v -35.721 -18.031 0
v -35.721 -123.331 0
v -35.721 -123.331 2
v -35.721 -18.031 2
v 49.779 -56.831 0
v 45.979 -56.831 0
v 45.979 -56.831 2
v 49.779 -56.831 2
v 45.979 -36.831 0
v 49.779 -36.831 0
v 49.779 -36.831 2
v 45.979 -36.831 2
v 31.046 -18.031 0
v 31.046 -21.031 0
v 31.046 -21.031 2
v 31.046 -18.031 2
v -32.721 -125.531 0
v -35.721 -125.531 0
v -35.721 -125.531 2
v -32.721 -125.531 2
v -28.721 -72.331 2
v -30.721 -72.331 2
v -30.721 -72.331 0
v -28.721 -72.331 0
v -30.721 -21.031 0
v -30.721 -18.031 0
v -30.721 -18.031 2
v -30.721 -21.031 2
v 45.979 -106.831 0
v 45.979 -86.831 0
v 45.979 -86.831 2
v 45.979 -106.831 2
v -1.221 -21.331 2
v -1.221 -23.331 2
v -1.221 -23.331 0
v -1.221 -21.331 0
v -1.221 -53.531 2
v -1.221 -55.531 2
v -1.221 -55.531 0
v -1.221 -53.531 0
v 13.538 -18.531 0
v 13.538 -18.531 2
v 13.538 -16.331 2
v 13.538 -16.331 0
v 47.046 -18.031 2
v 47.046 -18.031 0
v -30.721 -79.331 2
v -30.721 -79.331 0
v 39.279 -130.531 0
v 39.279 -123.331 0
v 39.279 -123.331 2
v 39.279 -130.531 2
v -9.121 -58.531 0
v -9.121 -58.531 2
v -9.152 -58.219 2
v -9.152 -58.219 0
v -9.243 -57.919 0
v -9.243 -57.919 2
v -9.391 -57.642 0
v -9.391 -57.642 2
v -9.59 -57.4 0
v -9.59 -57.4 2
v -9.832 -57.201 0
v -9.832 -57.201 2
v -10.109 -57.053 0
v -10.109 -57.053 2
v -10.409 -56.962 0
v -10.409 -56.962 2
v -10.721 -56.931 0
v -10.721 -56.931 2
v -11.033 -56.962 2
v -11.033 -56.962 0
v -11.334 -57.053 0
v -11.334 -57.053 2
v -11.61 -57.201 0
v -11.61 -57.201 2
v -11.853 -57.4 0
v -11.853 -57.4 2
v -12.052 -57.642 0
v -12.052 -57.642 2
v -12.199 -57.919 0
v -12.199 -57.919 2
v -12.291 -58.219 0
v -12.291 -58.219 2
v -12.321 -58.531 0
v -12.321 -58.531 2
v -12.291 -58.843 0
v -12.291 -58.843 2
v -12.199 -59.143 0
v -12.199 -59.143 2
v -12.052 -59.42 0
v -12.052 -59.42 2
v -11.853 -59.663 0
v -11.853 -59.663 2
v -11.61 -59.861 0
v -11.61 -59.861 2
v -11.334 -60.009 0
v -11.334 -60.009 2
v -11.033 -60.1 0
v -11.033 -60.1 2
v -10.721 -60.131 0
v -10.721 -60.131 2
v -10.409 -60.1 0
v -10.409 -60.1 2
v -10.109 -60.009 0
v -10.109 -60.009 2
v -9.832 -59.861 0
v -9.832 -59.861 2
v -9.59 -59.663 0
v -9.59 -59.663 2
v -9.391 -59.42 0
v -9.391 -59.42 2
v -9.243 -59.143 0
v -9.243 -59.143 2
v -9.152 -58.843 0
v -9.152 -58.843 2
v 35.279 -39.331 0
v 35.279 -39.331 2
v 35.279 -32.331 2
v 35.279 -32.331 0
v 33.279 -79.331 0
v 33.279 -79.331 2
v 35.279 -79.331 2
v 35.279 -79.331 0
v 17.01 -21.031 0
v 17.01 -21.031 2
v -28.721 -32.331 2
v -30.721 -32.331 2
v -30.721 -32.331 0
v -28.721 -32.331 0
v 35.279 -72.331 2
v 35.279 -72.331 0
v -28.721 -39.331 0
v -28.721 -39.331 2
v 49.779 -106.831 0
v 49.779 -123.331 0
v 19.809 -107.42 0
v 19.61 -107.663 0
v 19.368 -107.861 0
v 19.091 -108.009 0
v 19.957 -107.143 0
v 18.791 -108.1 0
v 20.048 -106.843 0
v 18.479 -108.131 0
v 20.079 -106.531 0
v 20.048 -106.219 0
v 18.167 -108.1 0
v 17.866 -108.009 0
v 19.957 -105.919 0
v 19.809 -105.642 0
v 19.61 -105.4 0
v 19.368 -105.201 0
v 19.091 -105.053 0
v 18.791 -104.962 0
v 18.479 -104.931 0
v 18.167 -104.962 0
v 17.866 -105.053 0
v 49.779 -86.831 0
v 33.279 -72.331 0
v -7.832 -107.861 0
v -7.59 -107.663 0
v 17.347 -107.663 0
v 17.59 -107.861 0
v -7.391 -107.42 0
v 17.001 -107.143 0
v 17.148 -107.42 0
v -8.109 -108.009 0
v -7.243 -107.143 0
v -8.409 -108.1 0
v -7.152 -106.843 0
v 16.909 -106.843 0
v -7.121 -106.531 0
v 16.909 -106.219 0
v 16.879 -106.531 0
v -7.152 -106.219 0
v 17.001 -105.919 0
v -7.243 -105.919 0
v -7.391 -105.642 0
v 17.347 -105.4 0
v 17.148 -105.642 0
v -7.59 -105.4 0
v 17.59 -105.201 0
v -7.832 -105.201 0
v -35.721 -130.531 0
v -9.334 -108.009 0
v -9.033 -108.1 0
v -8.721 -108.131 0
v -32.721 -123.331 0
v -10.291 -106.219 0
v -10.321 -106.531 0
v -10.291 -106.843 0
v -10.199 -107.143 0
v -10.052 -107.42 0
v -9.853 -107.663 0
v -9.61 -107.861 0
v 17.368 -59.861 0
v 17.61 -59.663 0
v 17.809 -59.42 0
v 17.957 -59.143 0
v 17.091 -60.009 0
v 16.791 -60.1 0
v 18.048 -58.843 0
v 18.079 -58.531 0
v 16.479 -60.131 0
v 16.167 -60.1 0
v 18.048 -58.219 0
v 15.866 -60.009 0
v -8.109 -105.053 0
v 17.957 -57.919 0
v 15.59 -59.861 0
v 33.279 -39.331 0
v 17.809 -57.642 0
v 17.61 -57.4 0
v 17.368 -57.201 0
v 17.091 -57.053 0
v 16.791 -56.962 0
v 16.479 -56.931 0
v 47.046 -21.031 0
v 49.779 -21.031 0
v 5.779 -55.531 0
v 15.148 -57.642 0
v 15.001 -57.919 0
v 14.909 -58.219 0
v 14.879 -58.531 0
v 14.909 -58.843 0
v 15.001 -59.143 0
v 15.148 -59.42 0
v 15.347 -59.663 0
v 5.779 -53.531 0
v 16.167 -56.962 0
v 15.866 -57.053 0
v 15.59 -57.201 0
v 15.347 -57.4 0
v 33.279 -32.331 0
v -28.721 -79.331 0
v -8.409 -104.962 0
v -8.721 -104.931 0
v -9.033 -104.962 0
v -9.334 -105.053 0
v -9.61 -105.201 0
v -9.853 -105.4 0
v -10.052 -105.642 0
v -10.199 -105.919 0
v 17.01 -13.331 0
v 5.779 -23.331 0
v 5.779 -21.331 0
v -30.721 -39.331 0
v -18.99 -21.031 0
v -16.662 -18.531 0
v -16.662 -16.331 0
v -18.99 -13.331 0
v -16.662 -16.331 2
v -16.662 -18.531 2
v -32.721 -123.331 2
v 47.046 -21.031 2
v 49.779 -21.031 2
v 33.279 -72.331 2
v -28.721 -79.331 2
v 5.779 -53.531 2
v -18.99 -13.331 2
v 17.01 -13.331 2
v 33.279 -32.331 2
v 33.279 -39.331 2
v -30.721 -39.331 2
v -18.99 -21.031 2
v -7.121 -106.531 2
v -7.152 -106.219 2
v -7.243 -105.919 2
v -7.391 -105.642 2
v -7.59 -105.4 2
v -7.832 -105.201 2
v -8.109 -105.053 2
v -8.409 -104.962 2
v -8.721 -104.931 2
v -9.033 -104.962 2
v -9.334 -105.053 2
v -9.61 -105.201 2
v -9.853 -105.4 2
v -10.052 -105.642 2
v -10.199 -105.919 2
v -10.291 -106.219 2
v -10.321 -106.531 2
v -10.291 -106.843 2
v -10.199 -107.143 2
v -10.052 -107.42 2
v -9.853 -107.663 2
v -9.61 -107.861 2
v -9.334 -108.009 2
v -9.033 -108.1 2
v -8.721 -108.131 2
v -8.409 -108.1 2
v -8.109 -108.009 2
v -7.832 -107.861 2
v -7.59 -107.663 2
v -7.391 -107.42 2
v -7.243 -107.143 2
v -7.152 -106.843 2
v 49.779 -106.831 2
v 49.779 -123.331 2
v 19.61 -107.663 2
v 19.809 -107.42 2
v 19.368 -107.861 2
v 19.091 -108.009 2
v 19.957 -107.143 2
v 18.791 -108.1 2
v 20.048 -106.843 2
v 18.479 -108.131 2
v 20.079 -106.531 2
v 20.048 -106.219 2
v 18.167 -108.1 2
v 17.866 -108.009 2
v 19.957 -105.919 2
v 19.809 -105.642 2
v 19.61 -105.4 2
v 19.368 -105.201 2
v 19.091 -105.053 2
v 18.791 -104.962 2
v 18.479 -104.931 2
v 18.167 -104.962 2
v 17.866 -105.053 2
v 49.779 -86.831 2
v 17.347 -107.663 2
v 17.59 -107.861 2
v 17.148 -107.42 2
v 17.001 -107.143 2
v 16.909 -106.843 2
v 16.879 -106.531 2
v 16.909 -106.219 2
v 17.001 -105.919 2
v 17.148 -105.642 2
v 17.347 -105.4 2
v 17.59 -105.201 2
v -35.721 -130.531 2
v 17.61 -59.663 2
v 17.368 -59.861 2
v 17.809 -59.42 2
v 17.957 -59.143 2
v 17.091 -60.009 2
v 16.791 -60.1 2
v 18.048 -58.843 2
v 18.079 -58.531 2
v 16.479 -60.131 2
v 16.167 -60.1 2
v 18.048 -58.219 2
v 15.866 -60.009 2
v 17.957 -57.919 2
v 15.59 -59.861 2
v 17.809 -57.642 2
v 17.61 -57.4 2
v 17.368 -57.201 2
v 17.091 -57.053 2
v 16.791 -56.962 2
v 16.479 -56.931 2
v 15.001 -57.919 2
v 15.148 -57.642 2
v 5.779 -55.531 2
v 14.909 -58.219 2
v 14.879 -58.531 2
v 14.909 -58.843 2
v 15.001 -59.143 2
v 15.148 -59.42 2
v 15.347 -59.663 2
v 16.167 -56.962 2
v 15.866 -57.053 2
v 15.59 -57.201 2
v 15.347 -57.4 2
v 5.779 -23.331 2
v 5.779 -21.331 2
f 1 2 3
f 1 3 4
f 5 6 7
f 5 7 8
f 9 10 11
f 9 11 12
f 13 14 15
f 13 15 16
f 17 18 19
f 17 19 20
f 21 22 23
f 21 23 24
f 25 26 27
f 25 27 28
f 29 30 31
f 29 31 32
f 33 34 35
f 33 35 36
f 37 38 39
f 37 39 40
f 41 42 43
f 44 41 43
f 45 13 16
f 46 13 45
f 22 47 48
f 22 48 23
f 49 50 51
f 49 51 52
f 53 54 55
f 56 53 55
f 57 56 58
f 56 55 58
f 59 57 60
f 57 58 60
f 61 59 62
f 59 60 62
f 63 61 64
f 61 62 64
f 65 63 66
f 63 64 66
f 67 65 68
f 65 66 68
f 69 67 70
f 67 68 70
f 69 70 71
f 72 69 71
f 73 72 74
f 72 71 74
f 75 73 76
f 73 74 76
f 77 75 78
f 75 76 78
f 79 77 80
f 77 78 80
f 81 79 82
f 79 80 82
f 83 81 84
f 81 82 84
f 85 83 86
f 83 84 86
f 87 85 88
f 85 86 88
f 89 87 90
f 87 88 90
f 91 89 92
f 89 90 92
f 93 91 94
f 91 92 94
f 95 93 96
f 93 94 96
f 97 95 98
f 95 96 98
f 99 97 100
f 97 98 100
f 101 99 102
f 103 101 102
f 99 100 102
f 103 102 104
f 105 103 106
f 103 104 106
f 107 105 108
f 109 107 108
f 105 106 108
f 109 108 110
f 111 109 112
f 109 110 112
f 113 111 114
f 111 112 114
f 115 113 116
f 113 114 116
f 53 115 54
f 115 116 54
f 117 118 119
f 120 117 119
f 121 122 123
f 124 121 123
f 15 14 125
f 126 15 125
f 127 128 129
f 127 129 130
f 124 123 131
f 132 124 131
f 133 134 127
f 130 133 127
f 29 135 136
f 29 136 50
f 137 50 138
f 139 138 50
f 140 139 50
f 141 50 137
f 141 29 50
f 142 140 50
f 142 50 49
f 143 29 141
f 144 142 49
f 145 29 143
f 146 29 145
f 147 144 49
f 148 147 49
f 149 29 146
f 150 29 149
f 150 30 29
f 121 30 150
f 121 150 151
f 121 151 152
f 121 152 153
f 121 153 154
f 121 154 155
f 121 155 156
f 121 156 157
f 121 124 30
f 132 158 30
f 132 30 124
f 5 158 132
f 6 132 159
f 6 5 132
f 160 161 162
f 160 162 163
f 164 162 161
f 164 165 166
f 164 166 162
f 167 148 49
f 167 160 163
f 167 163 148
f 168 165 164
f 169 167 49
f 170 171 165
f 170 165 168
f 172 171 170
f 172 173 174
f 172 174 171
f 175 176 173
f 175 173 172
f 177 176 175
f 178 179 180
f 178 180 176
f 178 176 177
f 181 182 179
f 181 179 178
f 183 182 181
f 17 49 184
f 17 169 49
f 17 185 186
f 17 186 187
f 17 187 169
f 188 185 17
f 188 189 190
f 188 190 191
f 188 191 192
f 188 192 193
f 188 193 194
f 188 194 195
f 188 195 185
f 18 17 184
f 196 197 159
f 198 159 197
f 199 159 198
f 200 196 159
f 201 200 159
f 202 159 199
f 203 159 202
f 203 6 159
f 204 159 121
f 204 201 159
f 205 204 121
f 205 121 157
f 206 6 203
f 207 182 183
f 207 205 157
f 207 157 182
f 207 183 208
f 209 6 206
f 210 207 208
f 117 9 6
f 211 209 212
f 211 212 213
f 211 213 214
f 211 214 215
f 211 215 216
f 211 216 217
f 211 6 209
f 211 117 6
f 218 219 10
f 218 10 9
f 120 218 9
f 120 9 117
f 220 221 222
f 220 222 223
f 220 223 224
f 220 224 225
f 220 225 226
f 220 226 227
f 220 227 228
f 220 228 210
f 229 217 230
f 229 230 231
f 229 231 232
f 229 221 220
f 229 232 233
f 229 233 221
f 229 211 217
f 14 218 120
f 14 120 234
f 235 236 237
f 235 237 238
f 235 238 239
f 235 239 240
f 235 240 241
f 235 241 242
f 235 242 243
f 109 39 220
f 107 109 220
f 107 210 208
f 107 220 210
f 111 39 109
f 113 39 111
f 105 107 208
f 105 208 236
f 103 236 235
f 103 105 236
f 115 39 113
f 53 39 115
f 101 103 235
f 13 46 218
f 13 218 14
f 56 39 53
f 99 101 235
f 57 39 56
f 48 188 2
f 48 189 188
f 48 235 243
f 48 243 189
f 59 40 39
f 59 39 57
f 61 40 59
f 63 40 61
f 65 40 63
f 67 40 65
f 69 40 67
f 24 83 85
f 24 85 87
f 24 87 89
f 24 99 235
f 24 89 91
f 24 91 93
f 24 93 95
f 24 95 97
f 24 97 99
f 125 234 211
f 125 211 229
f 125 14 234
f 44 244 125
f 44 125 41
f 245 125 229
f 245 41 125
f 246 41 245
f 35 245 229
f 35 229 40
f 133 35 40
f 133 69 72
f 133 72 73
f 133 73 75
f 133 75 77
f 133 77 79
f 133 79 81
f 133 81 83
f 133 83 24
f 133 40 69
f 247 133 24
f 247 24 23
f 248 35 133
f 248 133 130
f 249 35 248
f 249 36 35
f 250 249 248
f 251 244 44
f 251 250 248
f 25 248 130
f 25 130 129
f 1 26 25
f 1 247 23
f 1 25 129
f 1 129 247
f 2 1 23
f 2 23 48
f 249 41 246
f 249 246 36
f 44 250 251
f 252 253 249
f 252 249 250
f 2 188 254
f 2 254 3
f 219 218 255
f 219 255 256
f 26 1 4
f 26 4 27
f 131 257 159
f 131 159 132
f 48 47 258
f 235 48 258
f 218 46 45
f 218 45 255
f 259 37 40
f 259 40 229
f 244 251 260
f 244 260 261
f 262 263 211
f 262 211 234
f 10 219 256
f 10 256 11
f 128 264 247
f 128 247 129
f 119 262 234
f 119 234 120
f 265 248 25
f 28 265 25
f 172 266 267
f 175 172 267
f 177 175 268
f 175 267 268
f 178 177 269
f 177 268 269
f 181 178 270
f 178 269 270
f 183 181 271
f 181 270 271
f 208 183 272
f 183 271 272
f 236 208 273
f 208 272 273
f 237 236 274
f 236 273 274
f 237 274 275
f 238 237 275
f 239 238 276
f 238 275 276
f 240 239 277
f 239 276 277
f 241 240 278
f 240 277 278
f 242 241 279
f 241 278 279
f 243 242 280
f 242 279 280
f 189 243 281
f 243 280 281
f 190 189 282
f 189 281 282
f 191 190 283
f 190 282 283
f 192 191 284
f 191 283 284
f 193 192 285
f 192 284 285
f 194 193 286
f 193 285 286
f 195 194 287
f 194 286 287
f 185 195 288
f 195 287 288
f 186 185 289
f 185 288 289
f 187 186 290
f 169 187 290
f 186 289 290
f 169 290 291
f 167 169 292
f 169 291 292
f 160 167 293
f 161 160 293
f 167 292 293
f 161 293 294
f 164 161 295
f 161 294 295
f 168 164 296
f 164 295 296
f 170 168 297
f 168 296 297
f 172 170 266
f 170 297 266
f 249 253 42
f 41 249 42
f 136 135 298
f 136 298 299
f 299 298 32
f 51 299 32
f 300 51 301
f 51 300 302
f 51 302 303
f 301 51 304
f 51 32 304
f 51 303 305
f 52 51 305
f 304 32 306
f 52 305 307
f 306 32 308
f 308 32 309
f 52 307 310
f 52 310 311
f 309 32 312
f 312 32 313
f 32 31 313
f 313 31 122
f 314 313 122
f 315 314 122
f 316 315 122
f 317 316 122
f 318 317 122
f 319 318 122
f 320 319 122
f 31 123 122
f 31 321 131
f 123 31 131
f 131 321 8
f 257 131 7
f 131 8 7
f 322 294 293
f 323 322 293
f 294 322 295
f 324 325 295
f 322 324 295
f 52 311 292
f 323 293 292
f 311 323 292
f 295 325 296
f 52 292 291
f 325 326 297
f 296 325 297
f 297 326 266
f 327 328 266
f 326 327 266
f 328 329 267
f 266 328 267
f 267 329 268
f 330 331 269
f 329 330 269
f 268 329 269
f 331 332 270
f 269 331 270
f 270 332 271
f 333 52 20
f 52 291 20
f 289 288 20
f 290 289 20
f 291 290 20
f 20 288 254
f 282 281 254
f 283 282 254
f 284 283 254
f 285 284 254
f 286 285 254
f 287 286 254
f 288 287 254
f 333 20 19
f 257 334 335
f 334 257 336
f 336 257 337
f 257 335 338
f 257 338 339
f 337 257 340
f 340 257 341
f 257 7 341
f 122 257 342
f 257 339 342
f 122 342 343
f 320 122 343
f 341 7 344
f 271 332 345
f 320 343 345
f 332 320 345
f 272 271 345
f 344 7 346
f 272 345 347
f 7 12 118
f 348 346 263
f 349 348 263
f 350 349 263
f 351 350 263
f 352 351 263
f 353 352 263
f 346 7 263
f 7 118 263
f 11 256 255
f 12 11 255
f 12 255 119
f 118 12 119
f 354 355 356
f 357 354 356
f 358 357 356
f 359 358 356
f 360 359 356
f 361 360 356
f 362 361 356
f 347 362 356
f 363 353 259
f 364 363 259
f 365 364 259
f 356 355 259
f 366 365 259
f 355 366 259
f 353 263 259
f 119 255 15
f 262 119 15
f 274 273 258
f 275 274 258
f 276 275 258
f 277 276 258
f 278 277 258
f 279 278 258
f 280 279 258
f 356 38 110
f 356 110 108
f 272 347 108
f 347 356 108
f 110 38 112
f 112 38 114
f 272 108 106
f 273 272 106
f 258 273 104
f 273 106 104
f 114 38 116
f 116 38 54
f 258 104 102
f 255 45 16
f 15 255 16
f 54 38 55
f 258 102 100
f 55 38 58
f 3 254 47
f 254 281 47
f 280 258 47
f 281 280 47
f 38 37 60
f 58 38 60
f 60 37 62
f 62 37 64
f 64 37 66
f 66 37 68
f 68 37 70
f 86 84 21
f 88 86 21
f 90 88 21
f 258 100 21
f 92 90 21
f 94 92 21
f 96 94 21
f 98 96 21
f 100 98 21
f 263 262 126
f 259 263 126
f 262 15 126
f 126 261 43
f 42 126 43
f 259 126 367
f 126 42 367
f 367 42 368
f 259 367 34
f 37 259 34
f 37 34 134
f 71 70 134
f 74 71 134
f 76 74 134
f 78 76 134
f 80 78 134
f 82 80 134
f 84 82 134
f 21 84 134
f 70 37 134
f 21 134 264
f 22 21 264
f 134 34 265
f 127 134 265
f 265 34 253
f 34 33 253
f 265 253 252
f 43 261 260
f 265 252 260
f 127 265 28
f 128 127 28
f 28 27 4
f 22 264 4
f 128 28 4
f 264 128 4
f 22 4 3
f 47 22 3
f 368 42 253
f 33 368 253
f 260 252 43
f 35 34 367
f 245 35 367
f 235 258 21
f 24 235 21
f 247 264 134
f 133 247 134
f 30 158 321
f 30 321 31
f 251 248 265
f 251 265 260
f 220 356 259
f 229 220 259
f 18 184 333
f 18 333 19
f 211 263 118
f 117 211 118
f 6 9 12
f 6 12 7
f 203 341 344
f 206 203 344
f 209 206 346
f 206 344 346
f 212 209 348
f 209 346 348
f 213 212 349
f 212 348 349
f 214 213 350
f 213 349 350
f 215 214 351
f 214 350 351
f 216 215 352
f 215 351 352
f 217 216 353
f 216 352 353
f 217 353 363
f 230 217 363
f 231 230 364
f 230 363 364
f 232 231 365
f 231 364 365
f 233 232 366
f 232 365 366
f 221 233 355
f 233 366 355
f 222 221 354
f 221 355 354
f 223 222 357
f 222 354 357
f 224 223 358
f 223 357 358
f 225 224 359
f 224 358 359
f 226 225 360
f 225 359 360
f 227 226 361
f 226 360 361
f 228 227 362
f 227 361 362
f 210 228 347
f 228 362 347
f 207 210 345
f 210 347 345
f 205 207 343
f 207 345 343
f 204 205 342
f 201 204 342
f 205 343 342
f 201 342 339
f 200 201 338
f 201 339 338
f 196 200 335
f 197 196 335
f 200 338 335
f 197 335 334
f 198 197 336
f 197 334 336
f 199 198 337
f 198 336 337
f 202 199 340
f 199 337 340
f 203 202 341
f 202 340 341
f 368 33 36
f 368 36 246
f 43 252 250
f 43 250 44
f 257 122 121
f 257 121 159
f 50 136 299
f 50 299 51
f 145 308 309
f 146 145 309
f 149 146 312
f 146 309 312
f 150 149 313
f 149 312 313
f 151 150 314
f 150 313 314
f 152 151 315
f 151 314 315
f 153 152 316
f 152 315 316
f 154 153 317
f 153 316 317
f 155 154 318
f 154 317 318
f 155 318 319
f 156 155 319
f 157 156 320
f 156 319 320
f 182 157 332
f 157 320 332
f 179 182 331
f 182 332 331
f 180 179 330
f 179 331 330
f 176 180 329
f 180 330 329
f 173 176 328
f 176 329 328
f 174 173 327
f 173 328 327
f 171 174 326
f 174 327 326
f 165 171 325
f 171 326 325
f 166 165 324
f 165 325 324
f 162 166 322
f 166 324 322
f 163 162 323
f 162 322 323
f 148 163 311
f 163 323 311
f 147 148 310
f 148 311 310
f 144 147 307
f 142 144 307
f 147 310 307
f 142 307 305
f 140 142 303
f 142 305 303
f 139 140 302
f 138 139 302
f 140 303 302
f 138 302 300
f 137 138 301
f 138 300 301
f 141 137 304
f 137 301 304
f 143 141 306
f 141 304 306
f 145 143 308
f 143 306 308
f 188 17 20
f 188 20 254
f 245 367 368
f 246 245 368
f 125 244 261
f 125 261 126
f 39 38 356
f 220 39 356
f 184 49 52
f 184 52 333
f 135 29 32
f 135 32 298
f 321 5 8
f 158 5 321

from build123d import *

# Parameters (mm, degrees)
AUFSATZ_LINEAR_AUSTRAGEN1_DEPTH = 2
SKIZZE2_R                       = 1.6
SKIZZE2_W                       = 2
SKIZZE2_H                       = 7
SKIZZE2_W_2                     = 7
SKIZZE2_H_2                     = 2
SCHNITT_LINEAR_AUSTRAGEN1_DEPTH = 2
SKIZZE3_W                       = 30.2
SKIZZE3_H                       = 2.2
SCHNITT_LINEAR_AUSTRAGEN2_DEPTH = 2


with BuildPart() as part:
    # Skizze1 → Aufsatz-Linear austragen1 (new body)
    with BuildSketch(Plane.XY):
        Polygon((39.278745883, -130.531139266), (-35.721254117, -130.531139266), (-35.721254117, -125.531139266), (-32.721254117, -125.531139266), (-32.721254117, -123.331139266), (-35.721254117, -123.331139266), (-35.721254117, -18.031139266), (-30.721254117, -18.031139266), (-30.721254117, -21.031139266), (-28.689548947, -21.031139266), (-23.428125466, -21.031139266), (-18.990357652, -21.031139266), (-18.990357652, -13.331139266), (17.009642348, -13.331139266), (17.009642348, -21.031139266), (22.500868798, -21.031139266), (28.500868798, -21.031139266), (31.045701771, -21.031139266), (31.045701771, -18.031139266), (47.045701771, -18.031139266), (47.045701771, -21.031139266), (49.778745883, -21.031139266), (49.778745883, -36.831139266), (45.978745883, -36.831139266), (45.978745883, -56.831139266), (49.778745883, -56.831139266), (49.778745883, -86.831139266), (45.978745883, -86.831139266), (45.978745883, -106.831139266), (49.778745883, -106.831139266), (49.778745883, -123.331139266), (39.278745883, -123.331139266), align=None)
    extrude(amount=AUFSATZ_LINEAR_AUSTRAGEN1_DEPTH)

    # Skizze2 → Schnitt-Linear austragen1 (cut)
    with BuildSketch(Plane.XY.offset(2)):
        with Locations((-10.721254117, -58.531139266)):
            Circle(SKIZZE2_R)
        with Locations((16.478745883, -58.531139266)):
            Circle(SKIZZE2_R)
        with Locations((-8.721254117, -106.531139266)):
            Circle(SKIZZE2_R)
        with Locations((18.478745883, -106.531139266)):
            Circle(SKIZZE2_R)
        with Locations((-29.721254117, -35.831139266)):
            Rectangle(SKIZZE2_W, SKIZZE2_H)
        with Locations((34.278745883, -35.831139266)):
            Rectangle(SKIZZE2_W, SKIZZE2_H)
        with Locations((-29.721254117, -75.831139266)):
            Rectangle(SKIZZE2_W, SKIZZE2_H)
        with Locations((34.278745883, -75.831139266)):
            Rectangle(SKIZZE2_W, SKIZZE2_H)
        with Locations((2.278745883, -54.531139266)):
            Rectangle(SKIZZE2_W_2, SKIZZE2_H_2)
        with Locations((2.278745883, -22.331139266)):
            Rectangle(SKIZZE2_W_2, SKIZZE2_H_2)
    extrude(amount=-SCHNITT_LINEAR_AUSTRAGEN1_DEPTH, mode=Mode.SUBTRACT)

    # Skizze3 → Schnitt-Linear austragen2 (cut)
    with BuildSketch(Plane.XY.offset(2)):
        with Locations((-1.561818921, -17.431139266)):
            Rectangle(SKIZZE3_W, SKIZZE3_H)
    extrude(amount=-SCHNITT_LINEAR_AUSTRAGEN2_DEPTH, mode=Mode.SUBTRACT)


solid = part.part
